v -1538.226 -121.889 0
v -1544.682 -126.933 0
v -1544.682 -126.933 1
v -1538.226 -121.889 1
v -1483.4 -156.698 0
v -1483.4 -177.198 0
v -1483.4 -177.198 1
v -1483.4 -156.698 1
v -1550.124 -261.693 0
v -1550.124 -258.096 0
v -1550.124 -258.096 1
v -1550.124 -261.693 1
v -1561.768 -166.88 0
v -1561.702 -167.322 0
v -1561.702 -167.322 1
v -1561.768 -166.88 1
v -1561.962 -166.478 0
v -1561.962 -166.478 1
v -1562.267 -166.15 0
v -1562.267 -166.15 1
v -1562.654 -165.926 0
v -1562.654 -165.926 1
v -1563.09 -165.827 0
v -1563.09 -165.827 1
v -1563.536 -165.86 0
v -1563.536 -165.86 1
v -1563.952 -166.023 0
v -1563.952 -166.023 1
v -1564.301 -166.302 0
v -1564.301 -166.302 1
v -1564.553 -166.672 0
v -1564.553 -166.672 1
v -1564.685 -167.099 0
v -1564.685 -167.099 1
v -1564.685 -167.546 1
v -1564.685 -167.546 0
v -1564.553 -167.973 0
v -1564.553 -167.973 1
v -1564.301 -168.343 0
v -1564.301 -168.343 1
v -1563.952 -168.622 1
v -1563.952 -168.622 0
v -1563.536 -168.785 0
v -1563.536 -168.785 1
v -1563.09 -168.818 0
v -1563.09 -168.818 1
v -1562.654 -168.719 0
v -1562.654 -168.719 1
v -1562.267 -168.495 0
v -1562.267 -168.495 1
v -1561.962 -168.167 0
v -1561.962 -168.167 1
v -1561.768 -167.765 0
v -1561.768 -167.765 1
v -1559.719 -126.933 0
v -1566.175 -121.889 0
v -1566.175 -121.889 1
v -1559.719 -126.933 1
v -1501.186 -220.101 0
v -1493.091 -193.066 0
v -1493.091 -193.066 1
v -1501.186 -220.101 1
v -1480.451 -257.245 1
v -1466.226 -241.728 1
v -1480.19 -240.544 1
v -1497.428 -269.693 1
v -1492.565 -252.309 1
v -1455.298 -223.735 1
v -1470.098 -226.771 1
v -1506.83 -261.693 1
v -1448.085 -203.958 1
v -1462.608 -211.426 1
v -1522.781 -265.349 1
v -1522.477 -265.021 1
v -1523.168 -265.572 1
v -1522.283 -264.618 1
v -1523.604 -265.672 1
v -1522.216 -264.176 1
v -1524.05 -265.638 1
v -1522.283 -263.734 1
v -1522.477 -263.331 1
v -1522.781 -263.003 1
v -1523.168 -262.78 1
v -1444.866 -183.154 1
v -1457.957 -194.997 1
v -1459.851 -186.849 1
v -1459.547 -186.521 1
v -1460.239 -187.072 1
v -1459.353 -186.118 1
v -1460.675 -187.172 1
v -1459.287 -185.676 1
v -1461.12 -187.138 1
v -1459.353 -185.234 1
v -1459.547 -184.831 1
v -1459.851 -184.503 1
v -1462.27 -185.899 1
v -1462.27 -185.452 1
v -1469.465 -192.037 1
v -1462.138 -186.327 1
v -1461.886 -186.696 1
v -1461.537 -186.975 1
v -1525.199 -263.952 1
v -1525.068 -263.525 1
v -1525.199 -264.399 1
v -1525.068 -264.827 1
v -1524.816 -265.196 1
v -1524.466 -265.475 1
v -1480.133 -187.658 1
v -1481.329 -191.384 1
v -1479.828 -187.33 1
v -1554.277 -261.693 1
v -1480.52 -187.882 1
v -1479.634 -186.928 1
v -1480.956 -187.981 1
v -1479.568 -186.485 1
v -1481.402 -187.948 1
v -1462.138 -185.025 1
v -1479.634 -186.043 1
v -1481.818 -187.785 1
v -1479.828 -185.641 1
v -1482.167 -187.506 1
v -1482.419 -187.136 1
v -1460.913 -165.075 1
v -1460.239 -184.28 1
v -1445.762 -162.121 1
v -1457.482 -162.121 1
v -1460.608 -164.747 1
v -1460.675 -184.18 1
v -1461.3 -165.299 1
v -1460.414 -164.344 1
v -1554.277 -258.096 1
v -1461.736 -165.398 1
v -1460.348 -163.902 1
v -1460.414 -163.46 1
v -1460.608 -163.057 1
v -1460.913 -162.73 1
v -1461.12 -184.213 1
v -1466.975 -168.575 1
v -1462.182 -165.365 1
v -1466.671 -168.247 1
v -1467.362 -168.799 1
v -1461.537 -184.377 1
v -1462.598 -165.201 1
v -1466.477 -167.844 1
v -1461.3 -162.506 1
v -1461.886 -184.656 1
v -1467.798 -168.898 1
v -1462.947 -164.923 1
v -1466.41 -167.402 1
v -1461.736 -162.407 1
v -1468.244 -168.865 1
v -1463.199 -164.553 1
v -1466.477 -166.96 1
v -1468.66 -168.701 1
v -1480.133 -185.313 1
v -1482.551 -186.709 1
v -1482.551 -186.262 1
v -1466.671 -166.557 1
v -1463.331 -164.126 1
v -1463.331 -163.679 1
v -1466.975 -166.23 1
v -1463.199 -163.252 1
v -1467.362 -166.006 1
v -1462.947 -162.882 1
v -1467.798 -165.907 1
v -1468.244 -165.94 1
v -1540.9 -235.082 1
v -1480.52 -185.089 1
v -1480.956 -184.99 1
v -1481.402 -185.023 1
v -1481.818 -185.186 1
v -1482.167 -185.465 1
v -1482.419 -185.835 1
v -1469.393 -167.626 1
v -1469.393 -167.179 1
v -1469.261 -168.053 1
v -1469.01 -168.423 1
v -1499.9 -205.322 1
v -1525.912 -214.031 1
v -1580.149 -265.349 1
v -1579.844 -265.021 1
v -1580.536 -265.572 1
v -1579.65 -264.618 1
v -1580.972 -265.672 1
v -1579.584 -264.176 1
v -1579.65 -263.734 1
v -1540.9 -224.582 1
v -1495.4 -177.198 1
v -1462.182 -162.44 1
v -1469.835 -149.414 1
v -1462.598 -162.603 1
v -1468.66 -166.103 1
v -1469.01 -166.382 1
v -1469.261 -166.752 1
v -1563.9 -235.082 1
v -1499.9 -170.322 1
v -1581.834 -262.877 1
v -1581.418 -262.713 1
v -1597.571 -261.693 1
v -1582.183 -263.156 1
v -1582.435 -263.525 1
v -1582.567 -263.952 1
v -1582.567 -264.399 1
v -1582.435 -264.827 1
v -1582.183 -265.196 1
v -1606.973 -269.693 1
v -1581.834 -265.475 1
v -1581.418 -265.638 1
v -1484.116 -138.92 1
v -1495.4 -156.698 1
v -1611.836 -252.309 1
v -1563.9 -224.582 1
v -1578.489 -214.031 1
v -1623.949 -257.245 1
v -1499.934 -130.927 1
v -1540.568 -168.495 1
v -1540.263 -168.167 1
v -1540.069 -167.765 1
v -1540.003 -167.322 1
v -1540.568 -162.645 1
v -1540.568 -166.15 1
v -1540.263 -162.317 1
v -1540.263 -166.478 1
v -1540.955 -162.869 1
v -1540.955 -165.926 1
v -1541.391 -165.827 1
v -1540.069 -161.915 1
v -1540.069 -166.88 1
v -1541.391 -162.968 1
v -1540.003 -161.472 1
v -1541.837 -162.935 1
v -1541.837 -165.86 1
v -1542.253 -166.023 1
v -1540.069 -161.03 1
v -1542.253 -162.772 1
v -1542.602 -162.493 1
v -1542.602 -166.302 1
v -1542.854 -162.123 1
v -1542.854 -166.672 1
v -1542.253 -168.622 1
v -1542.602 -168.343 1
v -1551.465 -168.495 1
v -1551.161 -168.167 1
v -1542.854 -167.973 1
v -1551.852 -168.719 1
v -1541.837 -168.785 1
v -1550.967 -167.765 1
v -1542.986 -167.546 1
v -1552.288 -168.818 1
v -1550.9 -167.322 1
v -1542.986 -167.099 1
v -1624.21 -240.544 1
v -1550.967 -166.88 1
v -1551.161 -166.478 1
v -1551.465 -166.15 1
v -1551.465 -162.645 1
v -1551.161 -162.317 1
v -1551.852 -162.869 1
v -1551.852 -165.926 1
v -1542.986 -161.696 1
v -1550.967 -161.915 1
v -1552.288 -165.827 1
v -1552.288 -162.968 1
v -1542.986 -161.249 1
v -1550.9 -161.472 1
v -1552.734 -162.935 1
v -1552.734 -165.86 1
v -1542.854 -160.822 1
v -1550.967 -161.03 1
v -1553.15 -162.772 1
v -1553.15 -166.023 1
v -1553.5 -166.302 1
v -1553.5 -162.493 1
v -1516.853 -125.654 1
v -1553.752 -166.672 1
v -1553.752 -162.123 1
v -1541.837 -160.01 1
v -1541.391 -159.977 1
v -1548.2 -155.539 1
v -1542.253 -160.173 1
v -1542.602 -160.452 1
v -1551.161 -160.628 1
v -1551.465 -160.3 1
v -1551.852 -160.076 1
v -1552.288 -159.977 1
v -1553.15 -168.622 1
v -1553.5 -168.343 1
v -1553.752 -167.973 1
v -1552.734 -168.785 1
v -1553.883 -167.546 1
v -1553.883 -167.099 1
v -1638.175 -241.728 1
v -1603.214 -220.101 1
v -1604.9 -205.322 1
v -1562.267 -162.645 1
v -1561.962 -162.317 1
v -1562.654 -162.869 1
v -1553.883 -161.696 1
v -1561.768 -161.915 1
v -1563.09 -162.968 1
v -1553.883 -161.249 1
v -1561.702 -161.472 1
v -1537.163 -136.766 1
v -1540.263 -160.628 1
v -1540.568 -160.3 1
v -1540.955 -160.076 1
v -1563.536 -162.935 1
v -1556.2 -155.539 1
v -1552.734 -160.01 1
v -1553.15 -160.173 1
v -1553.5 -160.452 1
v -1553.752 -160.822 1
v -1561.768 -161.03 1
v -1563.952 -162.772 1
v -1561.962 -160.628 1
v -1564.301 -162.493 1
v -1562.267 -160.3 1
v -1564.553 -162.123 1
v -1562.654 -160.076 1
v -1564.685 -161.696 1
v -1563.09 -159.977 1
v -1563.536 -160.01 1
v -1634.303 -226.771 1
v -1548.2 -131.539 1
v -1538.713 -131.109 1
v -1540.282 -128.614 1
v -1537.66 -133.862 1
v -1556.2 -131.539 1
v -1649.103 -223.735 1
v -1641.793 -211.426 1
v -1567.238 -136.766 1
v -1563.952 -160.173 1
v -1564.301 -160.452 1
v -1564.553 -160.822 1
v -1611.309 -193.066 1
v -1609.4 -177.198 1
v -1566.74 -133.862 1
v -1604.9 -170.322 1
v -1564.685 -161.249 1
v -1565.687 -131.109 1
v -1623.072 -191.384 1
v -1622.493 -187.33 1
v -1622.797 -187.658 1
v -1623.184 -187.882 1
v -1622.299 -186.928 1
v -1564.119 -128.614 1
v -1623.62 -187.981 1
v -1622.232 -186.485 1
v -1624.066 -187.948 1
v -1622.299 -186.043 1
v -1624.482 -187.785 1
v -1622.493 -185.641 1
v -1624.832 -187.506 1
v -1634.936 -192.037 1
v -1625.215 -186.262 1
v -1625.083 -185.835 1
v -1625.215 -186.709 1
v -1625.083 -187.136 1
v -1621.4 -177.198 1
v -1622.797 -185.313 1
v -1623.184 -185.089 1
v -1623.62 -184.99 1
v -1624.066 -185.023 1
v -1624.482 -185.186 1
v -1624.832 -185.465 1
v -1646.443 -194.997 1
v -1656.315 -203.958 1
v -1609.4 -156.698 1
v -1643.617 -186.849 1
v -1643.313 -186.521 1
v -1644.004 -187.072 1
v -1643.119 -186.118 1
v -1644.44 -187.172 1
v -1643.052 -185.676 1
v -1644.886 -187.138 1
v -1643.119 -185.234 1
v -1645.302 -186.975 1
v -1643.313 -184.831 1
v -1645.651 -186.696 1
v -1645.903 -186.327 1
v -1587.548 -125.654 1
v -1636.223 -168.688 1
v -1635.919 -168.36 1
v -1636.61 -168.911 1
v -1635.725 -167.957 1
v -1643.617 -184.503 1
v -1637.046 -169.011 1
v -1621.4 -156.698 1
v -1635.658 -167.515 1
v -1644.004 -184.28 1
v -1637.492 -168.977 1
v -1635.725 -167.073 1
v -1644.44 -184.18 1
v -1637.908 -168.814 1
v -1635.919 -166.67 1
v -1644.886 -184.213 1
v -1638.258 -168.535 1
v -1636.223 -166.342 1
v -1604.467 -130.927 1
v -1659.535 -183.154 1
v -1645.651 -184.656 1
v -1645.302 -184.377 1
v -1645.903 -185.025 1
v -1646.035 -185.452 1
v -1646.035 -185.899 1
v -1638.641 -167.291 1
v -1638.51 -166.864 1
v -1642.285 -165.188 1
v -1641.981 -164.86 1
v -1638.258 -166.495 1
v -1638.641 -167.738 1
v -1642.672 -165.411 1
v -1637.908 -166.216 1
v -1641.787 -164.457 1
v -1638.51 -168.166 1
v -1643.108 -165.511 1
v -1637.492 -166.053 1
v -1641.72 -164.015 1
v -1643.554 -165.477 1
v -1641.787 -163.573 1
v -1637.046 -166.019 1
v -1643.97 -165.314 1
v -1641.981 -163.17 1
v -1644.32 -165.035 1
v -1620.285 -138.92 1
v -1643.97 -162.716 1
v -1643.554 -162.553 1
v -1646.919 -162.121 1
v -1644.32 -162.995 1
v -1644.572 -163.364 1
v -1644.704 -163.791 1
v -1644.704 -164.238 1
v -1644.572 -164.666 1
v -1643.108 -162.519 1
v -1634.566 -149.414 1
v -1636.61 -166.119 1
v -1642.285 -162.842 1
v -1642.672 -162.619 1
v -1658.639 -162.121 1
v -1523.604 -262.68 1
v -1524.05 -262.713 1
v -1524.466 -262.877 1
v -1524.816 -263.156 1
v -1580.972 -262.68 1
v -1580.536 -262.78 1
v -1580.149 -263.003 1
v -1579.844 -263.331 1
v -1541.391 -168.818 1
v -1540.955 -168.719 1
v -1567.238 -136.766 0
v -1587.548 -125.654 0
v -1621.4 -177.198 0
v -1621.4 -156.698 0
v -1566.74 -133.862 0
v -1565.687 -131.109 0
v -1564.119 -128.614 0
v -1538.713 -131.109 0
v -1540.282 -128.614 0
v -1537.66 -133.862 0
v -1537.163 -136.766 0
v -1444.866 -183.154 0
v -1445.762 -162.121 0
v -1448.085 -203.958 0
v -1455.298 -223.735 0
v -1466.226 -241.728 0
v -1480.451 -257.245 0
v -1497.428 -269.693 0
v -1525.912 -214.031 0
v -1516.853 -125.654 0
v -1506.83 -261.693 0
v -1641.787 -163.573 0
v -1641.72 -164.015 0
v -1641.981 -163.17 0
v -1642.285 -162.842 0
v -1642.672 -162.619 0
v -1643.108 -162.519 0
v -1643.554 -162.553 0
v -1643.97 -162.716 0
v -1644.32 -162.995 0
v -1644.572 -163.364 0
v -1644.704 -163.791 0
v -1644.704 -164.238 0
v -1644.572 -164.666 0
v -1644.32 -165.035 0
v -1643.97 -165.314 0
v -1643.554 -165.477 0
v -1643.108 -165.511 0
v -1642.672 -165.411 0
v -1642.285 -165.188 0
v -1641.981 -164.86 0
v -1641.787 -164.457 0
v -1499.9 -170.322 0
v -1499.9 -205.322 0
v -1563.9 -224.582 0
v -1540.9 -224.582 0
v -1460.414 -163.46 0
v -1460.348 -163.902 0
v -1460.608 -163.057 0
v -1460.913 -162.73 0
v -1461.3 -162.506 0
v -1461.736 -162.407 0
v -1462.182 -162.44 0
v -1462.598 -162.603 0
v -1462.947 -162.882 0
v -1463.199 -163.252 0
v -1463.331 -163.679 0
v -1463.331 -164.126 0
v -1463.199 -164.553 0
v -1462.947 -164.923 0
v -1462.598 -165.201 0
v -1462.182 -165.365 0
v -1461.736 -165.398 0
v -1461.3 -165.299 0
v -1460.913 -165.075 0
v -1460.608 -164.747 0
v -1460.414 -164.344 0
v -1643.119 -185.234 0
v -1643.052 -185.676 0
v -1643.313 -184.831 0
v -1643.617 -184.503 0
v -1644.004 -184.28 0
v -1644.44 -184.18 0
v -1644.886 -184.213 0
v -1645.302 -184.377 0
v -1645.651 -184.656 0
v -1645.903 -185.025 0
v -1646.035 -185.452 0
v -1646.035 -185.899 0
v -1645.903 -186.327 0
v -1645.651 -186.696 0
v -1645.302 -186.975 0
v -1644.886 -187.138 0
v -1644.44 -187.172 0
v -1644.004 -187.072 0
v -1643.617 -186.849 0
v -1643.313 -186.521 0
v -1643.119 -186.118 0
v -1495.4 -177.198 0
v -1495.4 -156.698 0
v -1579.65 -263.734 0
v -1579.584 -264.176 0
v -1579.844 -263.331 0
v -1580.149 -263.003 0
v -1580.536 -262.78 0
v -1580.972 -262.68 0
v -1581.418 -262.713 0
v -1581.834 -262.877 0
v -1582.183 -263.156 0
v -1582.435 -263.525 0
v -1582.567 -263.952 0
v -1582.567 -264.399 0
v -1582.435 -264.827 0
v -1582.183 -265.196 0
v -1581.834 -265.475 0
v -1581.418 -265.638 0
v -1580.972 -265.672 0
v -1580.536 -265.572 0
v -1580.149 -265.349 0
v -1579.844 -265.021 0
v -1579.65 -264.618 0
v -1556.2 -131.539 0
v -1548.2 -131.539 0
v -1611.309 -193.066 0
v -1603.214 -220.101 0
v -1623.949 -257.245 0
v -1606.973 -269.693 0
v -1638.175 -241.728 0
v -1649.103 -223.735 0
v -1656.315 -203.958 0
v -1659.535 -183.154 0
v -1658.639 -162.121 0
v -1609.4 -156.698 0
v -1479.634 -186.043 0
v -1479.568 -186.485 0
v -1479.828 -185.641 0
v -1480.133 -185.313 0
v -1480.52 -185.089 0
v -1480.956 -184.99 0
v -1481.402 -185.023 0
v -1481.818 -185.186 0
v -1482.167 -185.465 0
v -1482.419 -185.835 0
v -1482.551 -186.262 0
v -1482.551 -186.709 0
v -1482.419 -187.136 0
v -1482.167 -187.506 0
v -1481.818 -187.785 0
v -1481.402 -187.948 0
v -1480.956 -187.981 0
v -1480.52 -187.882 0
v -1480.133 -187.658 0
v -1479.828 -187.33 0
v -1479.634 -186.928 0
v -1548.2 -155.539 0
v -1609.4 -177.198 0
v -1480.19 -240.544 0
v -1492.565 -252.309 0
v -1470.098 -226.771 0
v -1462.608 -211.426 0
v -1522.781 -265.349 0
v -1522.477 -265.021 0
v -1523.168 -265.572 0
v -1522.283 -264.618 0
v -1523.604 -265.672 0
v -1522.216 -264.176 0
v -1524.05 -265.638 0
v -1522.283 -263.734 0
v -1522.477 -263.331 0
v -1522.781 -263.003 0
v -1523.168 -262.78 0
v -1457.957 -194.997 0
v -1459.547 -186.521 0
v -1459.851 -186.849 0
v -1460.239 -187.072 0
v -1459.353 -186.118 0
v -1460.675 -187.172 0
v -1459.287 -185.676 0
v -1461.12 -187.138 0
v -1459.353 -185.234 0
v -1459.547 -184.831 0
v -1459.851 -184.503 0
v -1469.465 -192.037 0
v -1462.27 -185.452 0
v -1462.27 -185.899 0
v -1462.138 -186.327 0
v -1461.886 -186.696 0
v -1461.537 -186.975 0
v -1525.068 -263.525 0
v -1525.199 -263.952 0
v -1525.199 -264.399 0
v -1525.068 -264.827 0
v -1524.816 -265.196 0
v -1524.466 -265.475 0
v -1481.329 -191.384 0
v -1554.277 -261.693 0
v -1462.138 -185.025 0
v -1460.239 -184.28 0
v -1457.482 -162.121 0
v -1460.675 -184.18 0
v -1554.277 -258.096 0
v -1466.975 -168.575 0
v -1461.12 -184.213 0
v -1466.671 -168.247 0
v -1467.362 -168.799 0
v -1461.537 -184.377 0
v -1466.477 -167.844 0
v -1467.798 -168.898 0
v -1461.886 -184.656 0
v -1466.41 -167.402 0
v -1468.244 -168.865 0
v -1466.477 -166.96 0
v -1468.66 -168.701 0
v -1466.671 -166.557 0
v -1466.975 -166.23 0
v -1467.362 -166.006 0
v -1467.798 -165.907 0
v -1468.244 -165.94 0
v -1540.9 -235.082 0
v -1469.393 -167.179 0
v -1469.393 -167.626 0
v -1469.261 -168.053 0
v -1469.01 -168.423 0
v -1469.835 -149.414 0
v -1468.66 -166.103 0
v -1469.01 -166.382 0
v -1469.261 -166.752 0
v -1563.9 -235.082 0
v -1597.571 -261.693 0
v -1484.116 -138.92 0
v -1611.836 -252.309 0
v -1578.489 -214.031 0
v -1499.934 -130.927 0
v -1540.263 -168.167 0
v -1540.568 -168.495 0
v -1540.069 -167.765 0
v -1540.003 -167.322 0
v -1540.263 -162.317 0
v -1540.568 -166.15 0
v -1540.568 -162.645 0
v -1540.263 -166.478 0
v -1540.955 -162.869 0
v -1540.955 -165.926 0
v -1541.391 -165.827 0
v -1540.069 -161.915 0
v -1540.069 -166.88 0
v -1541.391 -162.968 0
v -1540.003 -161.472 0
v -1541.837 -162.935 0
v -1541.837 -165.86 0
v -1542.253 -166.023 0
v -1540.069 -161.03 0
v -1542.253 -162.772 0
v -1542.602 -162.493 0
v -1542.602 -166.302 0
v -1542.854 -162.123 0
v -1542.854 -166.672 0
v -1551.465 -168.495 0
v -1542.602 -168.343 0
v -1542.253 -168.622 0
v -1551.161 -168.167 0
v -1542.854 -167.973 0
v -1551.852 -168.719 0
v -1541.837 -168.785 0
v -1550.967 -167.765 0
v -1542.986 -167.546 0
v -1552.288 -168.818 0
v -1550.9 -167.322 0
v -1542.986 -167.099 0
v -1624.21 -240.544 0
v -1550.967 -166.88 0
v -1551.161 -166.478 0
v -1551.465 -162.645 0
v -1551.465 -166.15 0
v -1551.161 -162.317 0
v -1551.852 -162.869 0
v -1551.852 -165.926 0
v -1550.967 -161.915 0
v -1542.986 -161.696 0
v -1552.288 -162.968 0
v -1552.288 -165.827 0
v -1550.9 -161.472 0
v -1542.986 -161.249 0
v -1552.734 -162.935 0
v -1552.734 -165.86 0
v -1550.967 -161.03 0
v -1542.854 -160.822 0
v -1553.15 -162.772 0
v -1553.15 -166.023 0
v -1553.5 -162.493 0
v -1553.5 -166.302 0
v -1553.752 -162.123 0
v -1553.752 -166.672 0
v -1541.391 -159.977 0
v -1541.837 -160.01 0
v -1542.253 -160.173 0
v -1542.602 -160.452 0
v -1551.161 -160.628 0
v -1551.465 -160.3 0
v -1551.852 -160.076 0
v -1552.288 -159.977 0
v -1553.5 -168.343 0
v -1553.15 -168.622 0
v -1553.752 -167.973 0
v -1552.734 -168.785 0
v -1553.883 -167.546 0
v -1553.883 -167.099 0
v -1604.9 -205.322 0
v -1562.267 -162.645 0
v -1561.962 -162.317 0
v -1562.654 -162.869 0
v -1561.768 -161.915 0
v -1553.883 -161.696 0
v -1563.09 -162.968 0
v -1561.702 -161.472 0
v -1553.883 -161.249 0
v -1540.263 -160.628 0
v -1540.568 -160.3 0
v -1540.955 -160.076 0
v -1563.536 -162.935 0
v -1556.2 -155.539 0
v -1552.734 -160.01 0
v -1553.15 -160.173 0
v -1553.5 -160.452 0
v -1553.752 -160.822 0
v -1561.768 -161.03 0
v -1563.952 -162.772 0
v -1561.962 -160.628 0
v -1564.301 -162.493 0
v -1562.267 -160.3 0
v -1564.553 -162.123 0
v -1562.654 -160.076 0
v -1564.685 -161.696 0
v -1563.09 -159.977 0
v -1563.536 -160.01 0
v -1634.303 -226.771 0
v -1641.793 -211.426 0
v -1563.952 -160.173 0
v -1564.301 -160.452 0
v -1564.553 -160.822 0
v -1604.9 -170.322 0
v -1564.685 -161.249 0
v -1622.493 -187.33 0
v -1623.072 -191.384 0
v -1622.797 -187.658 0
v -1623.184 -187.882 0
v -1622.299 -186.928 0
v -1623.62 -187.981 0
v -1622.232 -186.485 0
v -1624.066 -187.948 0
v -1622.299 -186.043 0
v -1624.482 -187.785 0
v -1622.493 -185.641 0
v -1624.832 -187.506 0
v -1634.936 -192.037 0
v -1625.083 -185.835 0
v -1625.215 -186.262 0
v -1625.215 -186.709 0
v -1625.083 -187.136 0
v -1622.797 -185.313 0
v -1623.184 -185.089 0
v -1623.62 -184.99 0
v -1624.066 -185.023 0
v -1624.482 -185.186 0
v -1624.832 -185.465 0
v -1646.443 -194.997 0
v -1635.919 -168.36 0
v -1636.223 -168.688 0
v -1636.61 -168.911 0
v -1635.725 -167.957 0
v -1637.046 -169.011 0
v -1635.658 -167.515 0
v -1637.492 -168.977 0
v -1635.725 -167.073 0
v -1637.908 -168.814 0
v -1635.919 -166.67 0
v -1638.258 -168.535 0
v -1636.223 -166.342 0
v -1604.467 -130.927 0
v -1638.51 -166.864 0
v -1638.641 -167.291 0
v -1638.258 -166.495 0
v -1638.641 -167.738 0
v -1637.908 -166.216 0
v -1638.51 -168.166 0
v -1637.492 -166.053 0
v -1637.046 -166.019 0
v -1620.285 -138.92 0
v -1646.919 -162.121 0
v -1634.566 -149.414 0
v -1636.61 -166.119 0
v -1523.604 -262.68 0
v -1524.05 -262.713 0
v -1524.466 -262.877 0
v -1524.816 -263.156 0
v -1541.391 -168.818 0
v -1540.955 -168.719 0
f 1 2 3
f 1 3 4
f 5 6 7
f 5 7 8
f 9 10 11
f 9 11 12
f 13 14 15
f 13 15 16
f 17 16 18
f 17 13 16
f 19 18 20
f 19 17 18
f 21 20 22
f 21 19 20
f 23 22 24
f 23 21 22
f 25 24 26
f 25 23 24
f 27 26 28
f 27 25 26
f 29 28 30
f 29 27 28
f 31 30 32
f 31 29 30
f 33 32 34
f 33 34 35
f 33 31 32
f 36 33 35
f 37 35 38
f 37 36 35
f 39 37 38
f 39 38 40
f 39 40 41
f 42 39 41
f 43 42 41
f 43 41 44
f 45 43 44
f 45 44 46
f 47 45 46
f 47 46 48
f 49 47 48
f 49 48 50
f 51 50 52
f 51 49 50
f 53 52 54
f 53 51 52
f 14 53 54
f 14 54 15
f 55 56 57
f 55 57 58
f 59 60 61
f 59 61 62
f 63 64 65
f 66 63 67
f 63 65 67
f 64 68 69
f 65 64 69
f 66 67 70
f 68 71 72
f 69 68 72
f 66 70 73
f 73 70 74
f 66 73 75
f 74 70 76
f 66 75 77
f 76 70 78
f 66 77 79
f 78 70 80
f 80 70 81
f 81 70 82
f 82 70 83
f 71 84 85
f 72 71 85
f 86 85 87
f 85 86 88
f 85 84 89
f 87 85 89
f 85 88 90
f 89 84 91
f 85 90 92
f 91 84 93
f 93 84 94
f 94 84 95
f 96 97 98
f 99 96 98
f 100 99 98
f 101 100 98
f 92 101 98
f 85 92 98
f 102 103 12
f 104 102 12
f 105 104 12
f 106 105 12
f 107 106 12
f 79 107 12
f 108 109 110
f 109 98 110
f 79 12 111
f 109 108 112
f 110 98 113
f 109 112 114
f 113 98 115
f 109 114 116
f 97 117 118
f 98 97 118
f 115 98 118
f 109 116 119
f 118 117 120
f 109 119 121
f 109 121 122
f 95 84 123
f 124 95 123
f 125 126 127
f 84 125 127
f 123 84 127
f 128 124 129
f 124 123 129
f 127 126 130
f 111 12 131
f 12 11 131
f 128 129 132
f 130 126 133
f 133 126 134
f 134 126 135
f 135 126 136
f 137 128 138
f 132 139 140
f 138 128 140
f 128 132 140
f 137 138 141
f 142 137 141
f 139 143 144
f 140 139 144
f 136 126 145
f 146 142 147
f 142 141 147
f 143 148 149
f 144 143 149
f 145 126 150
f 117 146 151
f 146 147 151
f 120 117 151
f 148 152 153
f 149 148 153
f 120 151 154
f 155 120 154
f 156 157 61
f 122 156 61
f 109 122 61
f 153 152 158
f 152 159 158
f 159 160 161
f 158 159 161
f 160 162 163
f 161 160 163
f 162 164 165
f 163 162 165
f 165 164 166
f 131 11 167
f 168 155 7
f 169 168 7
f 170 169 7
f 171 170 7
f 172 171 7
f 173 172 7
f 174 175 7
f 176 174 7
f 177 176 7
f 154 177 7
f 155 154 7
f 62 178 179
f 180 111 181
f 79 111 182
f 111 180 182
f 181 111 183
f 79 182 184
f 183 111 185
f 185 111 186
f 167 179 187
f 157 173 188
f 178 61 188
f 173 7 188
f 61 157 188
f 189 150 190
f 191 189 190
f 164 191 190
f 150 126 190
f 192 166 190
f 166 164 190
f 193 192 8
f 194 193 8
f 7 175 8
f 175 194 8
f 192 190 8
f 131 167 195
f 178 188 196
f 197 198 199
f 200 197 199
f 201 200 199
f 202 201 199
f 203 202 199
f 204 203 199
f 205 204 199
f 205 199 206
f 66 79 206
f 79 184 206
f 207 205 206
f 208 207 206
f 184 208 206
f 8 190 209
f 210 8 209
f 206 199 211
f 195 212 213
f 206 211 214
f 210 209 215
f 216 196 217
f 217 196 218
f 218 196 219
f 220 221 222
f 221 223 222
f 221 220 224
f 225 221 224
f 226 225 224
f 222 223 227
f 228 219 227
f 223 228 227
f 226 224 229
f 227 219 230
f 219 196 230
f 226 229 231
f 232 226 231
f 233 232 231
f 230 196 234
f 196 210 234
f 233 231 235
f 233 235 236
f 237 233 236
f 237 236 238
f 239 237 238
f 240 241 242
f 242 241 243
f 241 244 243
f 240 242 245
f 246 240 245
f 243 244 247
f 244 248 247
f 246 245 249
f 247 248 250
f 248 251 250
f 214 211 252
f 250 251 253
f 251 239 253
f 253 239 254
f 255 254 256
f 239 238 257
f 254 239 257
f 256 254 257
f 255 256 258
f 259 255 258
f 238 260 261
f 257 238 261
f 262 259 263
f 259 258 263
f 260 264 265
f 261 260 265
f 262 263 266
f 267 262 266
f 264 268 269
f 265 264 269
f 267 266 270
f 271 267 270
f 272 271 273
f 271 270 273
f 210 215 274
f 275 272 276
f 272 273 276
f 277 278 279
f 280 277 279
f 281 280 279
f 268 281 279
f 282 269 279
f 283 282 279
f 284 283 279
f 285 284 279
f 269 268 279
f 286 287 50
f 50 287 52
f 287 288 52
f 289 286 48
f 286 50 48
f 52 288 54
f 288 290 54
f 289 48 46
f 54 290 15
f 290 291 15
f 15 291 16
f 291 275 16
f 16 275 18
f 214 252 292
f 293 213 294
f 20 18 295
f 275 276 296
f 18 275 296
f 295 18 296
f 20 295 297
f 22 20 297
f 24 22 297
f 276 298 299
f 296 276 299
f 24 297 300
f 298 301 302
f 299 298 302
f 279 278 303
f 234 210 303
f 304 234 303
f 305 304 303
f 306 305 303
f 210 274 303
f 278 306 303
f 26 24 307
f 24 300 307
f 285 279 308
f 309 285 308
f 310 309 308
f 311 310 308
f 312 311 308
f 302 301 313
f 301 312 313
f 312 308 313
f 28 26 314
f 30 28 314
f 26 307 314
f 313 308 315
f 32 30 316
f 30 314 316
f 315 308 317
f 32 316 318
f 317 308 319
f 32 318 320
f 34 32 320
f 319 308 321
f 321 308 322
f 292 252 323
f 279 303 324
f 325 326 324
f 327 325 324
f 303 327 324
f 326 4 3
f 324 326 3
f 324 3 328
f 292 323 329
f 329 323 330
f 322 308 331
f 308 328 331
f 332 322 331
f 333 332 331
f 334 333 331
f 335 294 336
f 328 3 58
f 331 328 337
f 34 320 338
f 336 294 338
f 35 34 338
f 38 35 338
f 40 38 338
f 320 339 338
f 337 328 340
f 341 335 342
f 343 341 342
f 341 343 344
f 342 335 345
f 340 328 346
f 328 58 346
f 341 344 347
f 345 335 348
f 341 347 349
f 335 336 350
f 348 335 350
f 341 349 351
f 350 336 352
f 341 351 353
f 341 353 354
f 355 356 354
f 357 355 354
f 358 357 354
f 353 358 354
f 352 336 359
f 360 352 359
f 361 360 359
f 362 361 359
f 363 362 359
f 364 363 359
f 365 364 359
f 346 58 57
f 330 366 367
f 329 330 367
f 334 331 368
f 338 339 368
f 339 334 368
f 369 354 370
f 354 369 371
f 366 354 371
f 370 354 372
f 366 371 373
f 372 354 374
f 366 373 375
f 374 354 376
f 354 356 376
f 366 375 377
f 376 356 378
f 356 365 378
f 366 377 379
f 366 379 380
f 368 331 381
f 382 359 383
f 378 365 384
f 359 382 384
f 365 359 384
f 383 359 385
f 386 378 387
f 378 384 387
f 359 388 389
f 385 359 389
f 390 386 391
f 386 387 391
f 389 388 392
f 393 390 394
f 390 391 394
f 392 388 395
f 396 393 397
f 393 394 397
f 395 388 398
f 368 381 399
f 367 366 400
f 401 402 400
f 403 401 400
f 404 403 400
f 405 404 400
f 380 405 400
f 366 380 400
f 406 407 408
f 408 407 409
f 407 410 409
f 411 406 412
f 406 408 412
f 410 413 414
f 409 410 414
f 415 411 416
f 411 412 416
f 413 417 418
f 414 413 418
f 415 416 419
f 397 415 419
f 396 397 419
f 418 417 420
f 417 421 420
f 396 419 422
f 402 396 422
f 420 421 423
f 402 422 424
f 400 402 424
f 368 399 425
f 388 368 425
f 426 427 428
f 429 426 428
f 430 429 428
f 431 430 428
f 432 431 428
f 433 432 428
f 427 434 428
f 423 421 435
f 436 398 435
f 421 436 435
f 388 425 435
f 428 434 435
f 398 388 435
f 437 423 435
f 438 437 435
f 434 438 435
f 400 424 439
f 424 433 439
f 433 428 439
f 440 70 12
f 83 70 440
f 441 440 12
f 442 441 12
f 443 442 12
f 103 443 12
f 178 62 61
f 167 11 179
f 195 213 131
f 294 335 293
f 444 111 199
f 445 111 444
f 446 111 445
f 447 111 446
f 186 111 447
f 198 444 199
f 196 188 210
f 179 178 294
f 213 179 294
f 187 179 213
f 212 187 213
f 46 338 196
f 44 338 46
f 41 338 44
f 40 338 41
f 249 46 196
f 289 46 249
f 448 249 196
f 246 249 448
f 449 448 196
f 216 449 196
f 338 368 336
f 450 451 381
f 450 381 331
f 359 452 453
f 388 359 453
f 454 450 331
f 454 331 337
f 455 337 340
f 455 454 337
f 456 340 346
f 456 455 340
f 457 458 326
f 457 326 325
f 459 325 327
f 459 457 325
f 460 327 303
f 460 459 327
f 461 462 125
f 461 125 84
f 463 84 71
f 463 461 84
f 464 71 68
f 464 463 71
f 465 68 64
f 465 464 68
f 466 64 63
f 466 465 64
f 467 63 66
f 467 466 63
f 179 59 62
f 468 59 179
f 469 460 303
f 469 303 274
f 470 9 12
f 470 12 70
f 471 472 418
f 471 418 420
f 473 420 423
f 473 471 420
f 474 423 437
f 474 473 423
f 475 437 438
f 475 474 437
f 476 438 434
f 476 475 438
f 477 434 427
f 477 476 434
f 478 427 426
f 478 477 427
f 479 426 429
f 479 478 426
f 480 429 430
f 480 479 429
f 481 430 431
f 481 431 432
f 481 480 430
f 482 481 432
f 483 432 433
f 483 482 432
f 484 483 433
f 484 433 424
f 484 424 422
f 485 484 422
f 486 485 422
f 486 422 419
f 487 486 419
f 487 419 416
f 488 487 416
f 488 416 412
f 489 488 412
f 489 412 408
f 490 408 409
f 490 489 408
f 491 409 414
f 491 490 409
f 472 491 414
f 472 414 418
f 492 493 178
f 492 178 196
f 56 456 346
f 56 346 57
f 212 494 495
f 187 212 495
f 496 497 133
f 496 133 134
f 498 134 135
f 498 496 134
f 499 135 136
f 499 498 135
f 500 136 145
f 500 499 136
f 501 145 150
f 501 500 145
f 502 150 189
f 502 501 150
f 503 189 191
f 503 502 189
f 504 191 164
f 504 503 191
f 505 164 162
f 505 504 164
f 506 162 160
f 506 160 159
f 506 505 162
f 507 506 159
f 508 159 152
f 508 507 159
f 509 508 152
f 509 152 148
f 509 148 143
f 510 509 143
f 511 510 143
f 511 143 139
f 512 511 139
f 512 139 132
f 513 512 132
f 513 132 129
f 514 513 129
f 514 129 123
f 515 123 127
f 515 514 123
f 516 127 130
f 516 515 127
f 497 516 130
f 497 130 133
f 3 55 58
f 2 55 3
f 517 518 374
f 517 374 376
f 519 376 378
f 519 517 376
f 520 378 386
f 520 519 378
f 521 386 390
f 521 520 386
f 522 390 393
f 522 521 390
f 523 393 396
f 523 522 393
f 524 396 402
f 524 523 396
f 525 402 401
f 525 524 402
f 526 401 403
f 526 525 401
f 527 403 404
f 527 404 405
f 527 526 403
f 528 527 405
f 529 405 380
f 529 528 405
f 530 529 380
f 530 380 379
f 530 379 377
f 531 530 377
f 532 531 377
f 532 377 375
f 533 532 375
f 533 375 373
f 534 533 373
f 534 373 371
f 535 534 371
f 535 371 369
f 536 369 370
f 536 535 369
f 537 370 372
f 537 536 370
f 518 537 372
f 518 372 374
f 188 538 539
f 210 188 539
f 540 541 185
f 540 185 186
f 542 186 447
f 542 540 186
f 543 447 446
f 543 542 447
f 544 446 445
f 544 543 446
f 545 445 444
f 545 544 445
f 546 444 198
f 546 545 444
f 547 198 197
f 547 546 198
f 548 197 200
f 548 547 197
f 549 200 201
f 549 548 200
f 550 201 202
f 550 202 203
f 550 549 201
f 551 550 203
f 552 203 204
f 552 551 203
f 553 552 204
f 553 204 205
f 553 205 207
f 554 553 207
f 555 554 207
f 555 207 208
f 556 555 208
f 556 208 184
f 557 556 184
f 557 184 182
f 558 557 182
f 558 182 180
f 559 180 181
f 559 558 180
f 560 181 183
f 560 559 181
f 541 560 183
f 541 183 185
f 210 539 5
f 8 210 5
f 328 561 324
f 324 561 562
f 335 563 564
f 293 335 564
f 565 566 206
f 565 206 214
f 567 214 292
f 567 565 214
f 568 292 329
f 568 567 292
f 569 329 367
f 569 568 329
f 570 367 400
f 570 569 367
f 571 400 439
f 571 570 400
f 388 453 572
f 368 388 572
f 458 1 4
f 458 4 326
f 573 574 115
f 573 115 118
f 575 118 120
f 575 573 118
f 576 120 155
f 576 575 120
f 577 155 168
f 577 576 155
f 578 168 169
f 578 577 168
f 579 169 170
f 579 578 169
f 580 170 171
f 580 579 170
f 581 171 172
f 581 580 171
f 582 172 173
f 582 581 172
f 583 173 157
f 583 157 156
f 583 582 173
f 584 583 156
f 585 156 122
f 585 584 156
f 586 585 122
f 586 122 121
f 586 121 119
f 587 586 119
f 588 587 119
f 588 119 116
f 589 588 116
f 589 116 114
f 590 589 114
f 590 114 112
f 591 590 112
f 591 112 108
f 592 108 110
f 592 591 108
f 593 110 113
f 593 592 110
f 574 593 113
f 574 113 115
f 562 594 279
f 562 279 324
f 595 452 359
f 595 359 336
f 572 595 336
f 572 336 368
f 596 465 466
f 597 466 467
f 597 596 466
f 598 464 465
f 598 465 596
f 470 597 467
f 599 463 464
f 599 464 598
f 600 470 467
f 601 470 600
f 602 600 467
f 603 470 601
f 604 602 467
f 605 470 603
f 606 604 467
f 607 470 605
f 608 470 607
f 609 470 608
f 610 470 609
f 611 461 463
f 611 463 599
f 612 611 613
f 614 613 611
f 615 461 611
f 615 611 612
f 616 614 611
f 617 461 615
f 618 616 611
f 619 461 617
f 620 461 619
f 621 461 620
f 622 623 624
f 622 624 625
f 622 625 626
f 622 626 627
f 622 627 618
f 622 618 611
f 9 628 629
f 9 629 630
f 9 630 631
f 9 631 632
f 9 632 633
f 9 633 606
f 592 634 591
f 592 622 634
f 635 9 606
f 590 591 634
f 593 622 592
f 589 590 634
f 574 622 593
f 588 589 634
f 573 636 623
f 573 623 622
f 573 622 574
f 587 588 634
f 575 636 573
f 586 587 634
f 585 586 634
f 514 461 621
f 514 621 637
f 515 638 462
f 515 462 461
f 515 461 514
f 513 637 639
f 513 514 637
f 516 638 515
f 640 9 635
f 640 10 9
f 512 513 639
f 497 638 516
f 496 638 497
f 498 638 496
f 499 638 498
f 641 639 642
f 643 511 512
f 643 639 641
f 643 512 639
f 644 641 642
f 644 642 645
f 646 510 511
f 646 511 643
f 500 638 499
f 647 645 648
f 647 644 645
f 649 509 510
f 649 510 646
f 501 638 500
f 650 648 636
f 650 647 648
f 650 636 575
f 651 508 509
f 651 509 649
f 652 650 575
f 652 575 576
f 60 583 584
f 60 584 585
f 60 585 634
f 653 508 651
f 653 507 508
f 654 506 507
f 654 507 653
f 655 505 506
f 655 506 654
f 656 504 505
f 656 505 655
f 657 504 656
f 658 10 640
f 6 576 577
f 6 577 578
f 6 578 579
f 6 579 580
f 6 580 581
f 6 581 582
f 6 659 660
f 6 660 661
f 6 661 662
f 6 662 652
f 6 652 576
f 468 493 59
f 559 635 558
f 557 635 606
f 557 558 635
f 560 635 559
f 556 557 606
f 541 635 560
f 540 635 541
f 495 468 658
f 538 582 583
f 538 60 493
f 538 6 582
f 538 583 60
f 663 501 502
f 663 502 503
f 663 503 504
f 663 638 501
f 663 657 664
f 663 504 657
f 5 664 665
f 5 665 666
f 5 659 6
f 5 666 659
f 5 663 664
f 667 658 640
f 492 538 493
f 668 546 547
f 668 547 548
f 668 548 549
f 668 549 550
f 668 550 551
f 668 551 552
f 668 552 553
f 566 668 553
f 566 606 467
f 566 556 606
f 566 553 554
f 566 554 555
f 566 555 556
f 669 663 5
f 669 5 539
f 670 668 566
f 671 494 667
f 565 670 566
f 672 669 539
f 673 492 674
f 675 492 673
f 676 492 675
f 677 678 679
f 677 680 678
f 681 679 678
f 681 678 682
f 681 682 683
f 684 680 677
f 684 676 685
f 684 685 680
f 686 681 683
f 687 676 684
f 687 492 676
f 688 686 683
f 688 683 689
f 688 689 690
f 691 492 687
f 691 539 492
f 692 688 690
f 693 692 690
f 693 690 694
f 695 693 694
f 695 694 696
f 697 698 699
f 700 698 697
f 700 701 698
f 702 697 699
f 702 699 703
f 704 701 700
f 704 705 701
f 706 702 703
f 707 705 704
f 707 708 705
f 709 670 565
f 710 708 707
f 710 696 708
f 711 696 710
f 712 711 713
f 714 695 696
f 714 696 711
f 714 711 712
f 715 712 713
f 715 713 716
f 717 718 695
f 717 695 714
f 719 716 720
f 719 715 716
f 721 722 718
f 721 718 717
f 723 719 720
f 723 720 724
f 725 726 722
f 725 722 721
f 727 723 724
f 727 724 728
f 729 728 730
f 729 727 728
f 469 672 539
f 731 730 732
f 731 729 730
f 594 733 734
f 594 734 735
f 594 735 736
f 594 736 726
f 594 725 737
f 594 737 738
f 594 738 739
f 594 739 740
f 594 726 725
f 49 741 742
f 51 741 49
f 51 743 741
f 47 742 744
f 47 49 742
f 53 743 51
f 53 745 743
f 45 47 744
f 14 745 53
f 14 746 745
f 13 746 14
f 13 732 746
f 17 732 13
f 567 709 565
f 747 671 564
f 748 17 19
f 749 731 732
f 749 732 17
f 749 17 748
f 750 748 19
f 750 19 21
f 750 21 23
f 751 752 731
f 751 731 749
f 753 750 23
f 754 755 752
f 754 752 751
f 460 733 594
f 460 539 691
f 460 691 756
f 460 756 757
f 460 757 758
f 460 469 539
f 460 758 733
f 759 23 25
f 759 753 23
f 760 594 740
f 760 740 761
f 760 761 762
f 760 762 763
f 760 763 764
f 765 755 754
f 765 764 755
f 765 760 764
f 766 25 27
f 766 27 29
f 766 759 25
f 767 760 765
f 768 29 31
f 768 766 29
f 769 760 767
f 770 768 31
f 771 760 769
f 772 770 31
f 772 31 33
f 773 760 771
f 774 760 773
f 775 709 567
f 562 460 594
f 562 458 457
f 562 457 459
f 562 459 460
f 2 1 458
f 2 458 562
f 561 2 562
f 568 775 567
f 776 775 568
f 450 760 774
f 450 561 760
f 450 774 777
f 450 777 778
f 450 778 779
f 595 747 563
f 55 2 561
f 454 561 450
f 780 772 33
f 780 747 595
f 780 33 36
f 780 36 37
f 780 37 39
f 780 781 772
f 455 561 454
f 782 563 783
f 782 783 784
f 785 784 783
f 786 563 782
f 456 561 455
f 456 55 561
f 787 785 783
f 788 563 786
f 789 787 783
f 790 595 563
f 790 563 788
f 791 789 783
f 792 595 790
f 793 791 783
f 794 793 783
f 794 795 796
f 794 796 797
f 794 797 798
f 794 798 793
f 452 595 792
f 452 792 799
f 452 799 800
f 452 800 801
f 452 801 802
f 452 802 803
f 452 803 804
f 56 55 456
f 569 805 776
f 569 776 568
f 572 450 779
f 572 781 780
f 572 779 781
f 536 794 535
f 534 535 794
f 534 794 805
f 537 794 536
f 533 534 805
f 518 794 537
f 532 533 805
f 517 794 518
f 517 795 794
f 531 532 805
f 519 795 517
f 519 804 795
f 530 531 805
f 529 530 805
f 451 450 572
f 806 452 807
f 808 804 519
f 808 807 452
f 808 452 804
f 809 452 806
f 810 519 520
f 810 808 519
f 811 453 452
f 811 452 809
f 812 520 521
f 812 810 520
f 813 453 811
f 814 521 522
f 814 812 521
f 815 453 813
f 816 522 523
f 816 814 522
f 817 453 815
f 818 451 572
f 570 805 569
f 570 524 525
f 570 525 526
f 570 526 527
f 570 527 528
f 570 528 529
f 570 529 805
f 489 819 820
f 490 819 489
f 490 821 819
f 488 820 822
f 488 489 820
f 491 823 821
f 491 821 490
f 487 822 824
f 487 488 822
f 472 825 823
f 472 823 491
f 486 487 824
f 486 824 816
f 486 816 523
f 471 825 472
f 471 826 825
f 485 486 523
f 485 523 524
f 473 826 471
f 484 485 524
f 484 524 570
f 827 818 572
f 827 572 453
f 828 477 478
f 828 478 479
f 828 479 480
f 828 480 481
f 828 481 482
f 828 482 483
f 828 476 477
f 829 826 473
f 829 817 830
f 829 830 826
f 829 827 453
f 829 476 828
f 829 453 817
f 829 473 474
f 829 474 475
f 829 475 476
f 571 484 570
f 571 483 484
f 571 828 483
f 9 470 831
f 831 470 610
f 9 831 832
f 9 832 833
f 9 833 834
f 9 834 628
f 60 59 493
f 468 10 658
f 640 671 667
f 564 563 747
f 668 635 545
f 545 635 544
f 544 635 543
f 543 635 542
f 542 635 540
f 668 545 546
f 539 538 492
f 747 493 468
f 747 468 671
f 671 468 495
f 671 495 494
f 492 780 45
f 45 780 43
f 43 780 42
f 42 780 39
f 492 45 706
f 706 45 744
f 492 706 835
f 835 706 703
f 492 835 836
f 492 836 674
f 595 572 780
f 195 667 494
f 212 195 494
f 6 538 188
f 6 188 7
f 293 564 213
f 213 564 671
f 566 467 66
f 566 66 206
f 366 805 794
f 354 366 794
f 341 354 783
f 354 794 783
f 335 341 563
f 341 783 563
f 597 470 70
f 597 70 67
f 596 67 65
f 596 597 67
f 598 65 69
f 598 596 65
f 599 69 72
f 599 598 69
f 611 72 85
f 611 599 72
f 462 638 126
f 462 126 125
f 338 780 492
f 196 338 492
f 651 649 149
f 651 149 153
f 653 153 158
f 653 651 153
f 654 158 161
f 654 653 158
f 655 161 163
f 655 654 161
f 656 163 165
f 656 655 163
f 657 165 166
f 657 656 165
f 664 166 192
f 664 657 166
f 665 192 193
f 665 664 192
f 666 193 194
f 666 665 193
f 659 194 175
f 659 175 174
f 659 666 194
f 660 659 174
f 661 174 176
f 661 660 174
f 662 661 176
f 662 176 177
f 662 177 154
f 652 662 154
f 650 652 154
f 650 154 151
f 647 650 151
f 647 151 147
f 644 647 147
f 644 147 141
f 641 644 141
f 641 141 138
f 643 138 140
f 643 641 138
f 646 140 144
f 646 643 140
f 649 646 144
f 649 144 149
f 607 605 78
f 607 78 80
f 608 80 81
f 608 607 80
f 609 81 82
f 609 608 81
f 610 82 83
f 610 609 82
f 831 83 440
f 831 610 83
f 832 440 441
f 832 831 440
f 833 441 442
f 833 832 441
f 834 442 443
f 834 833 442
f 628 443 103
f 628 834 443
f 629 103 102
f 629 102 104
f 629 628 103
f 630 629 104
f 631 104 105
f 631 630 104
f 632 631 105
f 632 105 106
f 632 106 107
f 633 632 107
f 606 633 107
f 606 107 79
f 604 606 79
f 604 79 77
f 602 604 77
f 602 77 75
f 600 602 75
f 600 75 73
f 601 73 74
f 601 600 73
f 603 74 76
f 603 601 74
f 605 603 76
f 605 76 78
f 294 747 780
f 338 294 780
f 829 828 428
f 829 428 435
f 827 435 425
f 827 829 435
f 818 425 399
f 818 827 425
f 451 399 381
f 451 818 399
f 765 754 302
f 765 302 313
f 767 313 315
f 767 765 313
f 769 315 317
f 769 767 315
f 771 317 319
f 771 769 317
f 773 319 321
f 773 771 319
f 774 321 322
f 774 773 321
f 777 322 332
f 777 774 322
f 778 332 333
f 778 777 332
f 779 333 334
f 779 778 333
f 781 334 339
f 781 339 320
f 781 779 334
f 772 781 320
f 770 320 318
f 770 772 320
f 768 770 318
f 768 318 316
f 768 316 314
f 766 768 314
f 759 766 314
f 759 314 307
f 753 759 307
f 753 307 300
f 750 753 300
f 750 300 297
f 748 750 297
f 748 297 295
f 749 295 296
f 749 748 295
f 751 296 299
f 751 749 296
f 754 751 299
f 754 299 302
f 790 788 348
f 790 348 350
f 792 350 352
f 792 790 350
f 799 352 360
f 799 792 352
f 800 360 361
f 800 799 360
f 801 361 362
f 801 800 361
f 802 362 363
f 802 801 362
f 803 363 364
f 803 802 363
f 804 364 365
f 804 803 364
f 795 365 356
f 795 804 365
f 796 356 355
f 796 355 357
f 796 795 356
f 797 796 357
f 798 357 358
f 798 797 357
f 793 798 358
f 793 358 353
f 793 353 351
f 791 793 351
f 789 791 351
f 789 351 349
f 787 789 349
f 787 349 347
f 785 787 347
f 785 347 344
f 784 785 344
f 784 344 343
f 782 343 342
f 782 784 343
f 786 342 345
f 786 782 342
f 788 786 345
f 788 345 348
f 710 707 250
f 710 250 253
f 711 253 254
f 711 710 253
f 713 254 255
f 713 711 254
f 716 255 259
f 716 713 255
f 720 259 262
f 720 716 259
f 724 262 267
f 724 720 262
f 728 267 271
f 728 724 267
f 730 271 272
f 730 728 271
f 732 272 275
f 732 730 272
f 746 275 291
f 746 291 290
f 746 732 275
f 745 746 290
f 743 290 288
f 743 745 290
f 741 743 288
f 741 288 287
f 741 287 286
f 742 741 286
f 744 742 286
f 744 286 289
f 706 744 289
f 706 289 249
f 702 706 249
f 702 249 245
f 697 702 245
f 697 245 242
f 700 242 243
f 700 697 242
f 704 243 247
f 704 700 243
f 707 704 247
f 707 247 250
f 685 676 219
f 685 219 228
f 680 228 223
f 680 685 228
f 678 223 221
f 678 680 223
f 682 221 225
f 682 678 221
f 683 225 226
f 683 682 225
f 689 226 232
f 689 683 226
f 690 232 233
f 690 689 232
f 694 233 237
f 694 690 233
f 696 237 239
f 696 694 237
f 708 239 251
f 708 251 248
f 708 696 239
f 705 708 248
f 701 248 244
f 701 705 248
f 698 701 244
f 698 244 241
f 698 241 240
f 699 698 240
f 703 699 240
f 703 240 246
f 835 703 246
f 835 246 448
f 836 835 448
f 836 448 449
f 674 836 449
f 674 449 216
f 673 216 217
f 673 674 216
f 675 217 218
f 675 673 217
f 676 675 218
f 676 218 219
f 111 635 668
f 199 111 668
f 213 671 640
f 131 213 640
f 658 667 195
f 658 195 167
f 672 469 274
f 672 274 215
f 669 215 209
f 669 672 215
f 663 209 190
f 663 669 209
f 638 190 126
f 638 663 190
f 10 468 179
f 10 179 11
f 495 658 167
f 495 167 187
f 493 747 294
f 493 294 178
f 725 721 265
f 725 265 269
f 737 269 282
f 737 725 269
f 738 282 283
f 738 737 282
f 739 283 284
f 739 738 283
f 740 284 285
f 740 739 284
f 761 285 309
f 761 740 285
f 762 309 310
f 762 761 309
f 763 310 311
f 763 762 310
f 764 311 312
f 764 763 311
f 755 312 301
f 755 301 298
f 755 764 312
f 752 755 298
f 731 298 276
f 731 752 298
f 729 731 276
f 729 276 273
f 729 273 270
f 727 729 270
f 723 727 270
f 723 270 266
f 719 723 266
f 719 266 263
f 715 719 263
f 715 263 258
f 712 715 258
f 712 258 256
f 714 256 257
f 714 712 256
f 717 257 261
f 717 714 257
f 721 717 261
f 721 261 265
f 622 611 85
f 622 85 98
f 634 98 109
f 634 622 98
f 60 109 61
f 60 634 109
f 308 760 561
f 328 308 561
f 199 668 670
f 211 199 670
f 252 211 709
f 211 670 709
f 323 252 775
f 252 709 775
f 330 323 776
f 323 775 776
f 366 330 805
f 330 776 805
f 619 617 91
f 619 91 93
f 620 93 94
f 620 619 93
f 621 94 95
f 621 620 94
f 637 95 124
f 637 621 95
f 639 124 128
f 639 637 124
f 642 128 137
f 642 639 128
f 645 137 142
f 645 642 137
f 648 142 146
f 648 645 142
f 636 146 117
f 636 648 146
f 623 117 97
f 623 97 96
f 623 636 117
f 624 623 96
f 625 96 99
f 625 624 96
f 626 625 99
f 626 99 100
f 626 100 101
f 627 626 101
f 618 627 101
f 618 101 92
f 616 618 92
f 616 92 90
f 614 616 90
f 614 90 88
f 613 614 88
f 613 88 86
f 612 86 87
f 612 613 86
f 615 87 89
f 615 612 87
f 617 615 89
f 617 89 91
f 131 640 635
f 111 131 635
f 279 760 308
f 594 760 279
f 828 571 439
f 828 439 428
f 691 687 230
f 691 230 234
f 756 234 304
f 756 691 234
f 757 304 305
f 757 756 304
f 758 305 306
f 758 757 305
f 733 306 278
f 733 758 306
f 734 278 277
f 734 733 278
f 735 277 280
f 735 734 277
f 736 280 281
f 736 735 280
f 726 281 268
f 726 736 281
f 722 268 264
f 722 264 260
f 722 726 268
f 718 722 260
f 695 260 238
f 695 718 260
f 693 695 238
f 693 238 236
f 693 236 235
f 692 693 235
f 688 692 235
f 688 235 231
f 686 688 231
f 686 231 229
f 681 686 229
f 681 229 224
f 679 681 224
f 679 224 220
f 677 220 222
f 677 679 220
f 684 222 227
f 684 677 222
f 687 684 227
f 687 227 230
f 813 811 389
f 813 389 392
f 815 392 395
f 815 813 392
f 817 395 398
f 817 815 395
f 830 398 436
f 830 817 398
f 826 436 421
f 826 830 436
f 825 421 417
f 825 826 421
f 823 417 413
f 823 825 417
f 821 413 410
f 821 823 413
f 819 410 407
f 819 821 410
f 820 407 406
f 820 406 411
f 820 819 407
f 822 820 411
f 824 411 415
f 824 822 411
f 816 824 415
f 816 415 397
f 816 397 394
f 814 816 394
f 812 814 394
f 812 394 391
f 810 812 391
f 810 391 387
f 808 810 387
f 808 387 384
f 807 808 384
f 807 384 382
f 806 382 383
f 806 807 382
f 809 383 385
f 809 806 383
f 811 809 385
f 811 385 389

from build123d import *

# Parameters (mm, degrees)
CROQUIS1_R              = 1.5
CROQUIS1_W              = 23
CROQUIS1_H              = 10.5
CROQUIS1_W_2            = 12
CROQUIS1_H_2            = 20.5
CROQUIS1_W_3            = 8
CROQUIS1_H_3            = 24
CROQUIS1_W_4            = 105
CROQUIS1_H_4            = 35
SALIENTE_EXTRUIR1_DEPTH = 1


with BuildPart() as part:
    # Croquis1 → Saliente-Extruir1 (new body)
    with BuildSketch(Plane.XY):
        with BuildLine():
            Line((-1537.163110479, -136.766453489), (-1516.853146696, -125.6542904))
            ThreePointArc((-1516.853146696, -125.6542904), (-1484.11625712, -138.920059749), (-1457.482039397, -162.121417938))
            Line((-1457.482039397, -162.121417938), (-1445.993940748, -162.121417938))
            Line((-1445.993940748, -162.121417938), (-1445.762202271, -162.121417938))
            ThreePointArc((-1445.762202271, -162.121417938), (-1455.297709344, -223.734904974), (-1497.428135695, -269.693308507))
            Line((-1497.428135695, -269.693308507), (-1552.200391445, -269.693308507))
            Line((-1552.200391445, -269.693308507), (-1606.972647196, -269.693308507))
            ThreePointArc((-1606.972647196, -269.693308507), (-1649.103073546, -223.734904974), (-1658.638580619, -162.121417938))
            Line((-1658.638580619, -162.121417938), (-1646.918743493, -162.121417938))
            ThreePointArc((-1646.918743493, -162.121417938), (-1620.284525771, -138.920059749), (-1587.547636195, -125.6542904))
            Line((-1587.547636195, -125.6542904), (-1567.237672411, -136.766453489))
            ThreePointArc((-1567.237672411, -136.766453489), (-1566.281329143, -132.459607123), (-1564.119167026, -128.614015745))
            Line((-1564.119167026, -128.614015745), (-1566.175134815, -121.889248119))
            Line((-1566.175134815, -121.889248119), (-1559.719031928, -126.933308507))
            Line((-1559.719031928, -126.933308507), (-1544.681750962, -126.933308507))
            Line((-1544.681750962, -126.933308507), (-1538.225648075, -121.889248119))
            Line((-1538.225648075, -121.889248119), (-1540.281615865, -128.614015745))
            ThreePointArc((-1540.281615865, -128.614015745), (-1538.119453748, -132.459607123), (-1537.163110479, -136.766453489))
        make_face()
        with Locations((-1523.716235661, -264.175855838)):
            Circle(CROQUIS1_R, mode=Mode.SUBTRACT)
        with Locations((-1644.551864676, -185.675855838)):
            Circle(CROQUIS1_R, mode=Mode.SUBTRACT)
        with Locations((-1541.502776276, -167.322485879)):
            Circle(CROQUIS1_R, mode=Mode.SUBTRACT)
        with Locations((-1552.400156362, -167.322485879)):
            Circle(CROQUIS1_R, mode=Mode.SUBTRACT)
        with Locations((-1563.201766149, -167.322485879)):
            Circle(CROQUIS1_R, mode=Mode.SUBTRACT)
        with Locations((-1552.400156362, -161.472485879)):
            Circle(CROQUIS1_R, mode=Mode.SUBTRACT)
        with Locations((-1460.786663592, -185.675855838)):
            Circle(CROQUIS1_R, mode=Mode.SUBTRACT)
        with Locations((-1461.847779246, -163.902354835)):
            Circle(CROQUIS1_R, mode=Mode.SUBTRACT)
        with Locations((-1643.220327484, -164.014915474)):
            Circle(CROQUIS1_R, mode=Mode.SUBTRACT)
        with Locations((-1563.201766149, -161.472485879)):
            Circle(CROQUIS1_R, mode=Mode.SUBTRACT)
        with Locations((-1541.502776276, -161.472485879)):
            Circle(CROQUIS1_R, mode=Mode.SUBTRACT)
        with Locations((-1581.083835661, -264.175855838)):
            Circle(CROQUIS1_R, mode=Mode.SUBTRACT)
        with Locations((-1637.158149658, -167.514915474)):
            Circle(CROQUIS1_R, mode=Mode.SUBTRACT)
        with Locations((-1467.909957073, -167.402354835)):
            Circle(CROQUIS1_R, mode=Mode.SUBTRACT)
        with Locations((-1623.732006953, -186.485491114)):
            Circle(CROQUIS1_R, mode=Mode.SUBTRACT)
        with Locations((-1481.067822966, -186.485491114)):
            Circle(CROQUIS1_R, mode=Mode.SUBTRACT)
        with BuildLine():
            Line((-1550.123752332, -261.693308507), (-1506.829937403, -261.693308507))
            ThreePointArc((-1506.829937403, -261.693308507), (-1474.837098768, -233.882364295), (-1457.957337533, -194.997097128))
            ThreePointArc((-1457.957337533, -194.997097128), (-1475.380705089, -191.41817703), (-1493.091376833, -193.065754767))
            Line((-1493.091376833, -193.065754767), (-1501.186287871, -220.101341452))
            Line((-1501.186287871, -220.101341452), (-1525.911955882, -214.031108862))
            Line((-1525.911955882, -214.031108862), (-1550.123752332, -258.096464053))
            Line((-1550.123752332, -258.096464053), (-1550.123752332, -261.693308507))
        make_face(mode=Mode.SUBTRACT)
        with BuildLine():
            Line((-1578.488827009, -214.031108862), (-1554.277030559, -258.096464053))
            Line((-1554.277030559, -258.096464053), (-1554.277030559, -261.693308507))
            Line((-1554.277030559, -261.693308507), (-1597.570845488, -261.693308507))
            ThreePointArc((-1597.570845488, -261.693308507), (-1629.563684123, -233.882364295), (-1646.443445358, -194.997097128))
            ThreePointArc((-1646.443445358, -194.997097128), (-1629.020077802, -191.41817703), (-1611.309406057, -193.065754767))
            Line((-1611.309406057, -193.065754767), (-1603.21449502, -220.101341452))
            Line((-1603.21449502, -220.101341452), (-1578.488827009, -214.031108862))
        make_face(mode=Mode.SUBTRACT)
        with Locations((-1552.400156362, -229.832455111)):
            Rectangle(CROQUIS1_W, CROQUIS1_H, mode=Mode.SUBTRACT)
        with Locations((-1489.400156362, -166.947886235)):
            Rectangle(CROQUIS1_W_2, CROQUIS1_H_2, mode=Mode.SUBTRACT)
        with Locations((-1615.400156362, -166.947886235)):
            Rectangle(CROQUIS1_W_2, CROQUIS1_H_2, mode=Mode.SUBTRACT)
        with Locations((-1552.200391445, -143.53903119)):
            Rectangle(CROQUIS1_W_3, CROQUIS1_H_3, mode=Mode.SUBTRACT)
        with Locations((-1552.400156362, -187.822466505)):
            Rectangle(CROQUIS1_W_4, CROQUIS1_H_4, mode=Mode.SUBTRACT)
    extrude(amount=SALIENTE_EXTRUIR1_DEPTH)


solid = part.part
